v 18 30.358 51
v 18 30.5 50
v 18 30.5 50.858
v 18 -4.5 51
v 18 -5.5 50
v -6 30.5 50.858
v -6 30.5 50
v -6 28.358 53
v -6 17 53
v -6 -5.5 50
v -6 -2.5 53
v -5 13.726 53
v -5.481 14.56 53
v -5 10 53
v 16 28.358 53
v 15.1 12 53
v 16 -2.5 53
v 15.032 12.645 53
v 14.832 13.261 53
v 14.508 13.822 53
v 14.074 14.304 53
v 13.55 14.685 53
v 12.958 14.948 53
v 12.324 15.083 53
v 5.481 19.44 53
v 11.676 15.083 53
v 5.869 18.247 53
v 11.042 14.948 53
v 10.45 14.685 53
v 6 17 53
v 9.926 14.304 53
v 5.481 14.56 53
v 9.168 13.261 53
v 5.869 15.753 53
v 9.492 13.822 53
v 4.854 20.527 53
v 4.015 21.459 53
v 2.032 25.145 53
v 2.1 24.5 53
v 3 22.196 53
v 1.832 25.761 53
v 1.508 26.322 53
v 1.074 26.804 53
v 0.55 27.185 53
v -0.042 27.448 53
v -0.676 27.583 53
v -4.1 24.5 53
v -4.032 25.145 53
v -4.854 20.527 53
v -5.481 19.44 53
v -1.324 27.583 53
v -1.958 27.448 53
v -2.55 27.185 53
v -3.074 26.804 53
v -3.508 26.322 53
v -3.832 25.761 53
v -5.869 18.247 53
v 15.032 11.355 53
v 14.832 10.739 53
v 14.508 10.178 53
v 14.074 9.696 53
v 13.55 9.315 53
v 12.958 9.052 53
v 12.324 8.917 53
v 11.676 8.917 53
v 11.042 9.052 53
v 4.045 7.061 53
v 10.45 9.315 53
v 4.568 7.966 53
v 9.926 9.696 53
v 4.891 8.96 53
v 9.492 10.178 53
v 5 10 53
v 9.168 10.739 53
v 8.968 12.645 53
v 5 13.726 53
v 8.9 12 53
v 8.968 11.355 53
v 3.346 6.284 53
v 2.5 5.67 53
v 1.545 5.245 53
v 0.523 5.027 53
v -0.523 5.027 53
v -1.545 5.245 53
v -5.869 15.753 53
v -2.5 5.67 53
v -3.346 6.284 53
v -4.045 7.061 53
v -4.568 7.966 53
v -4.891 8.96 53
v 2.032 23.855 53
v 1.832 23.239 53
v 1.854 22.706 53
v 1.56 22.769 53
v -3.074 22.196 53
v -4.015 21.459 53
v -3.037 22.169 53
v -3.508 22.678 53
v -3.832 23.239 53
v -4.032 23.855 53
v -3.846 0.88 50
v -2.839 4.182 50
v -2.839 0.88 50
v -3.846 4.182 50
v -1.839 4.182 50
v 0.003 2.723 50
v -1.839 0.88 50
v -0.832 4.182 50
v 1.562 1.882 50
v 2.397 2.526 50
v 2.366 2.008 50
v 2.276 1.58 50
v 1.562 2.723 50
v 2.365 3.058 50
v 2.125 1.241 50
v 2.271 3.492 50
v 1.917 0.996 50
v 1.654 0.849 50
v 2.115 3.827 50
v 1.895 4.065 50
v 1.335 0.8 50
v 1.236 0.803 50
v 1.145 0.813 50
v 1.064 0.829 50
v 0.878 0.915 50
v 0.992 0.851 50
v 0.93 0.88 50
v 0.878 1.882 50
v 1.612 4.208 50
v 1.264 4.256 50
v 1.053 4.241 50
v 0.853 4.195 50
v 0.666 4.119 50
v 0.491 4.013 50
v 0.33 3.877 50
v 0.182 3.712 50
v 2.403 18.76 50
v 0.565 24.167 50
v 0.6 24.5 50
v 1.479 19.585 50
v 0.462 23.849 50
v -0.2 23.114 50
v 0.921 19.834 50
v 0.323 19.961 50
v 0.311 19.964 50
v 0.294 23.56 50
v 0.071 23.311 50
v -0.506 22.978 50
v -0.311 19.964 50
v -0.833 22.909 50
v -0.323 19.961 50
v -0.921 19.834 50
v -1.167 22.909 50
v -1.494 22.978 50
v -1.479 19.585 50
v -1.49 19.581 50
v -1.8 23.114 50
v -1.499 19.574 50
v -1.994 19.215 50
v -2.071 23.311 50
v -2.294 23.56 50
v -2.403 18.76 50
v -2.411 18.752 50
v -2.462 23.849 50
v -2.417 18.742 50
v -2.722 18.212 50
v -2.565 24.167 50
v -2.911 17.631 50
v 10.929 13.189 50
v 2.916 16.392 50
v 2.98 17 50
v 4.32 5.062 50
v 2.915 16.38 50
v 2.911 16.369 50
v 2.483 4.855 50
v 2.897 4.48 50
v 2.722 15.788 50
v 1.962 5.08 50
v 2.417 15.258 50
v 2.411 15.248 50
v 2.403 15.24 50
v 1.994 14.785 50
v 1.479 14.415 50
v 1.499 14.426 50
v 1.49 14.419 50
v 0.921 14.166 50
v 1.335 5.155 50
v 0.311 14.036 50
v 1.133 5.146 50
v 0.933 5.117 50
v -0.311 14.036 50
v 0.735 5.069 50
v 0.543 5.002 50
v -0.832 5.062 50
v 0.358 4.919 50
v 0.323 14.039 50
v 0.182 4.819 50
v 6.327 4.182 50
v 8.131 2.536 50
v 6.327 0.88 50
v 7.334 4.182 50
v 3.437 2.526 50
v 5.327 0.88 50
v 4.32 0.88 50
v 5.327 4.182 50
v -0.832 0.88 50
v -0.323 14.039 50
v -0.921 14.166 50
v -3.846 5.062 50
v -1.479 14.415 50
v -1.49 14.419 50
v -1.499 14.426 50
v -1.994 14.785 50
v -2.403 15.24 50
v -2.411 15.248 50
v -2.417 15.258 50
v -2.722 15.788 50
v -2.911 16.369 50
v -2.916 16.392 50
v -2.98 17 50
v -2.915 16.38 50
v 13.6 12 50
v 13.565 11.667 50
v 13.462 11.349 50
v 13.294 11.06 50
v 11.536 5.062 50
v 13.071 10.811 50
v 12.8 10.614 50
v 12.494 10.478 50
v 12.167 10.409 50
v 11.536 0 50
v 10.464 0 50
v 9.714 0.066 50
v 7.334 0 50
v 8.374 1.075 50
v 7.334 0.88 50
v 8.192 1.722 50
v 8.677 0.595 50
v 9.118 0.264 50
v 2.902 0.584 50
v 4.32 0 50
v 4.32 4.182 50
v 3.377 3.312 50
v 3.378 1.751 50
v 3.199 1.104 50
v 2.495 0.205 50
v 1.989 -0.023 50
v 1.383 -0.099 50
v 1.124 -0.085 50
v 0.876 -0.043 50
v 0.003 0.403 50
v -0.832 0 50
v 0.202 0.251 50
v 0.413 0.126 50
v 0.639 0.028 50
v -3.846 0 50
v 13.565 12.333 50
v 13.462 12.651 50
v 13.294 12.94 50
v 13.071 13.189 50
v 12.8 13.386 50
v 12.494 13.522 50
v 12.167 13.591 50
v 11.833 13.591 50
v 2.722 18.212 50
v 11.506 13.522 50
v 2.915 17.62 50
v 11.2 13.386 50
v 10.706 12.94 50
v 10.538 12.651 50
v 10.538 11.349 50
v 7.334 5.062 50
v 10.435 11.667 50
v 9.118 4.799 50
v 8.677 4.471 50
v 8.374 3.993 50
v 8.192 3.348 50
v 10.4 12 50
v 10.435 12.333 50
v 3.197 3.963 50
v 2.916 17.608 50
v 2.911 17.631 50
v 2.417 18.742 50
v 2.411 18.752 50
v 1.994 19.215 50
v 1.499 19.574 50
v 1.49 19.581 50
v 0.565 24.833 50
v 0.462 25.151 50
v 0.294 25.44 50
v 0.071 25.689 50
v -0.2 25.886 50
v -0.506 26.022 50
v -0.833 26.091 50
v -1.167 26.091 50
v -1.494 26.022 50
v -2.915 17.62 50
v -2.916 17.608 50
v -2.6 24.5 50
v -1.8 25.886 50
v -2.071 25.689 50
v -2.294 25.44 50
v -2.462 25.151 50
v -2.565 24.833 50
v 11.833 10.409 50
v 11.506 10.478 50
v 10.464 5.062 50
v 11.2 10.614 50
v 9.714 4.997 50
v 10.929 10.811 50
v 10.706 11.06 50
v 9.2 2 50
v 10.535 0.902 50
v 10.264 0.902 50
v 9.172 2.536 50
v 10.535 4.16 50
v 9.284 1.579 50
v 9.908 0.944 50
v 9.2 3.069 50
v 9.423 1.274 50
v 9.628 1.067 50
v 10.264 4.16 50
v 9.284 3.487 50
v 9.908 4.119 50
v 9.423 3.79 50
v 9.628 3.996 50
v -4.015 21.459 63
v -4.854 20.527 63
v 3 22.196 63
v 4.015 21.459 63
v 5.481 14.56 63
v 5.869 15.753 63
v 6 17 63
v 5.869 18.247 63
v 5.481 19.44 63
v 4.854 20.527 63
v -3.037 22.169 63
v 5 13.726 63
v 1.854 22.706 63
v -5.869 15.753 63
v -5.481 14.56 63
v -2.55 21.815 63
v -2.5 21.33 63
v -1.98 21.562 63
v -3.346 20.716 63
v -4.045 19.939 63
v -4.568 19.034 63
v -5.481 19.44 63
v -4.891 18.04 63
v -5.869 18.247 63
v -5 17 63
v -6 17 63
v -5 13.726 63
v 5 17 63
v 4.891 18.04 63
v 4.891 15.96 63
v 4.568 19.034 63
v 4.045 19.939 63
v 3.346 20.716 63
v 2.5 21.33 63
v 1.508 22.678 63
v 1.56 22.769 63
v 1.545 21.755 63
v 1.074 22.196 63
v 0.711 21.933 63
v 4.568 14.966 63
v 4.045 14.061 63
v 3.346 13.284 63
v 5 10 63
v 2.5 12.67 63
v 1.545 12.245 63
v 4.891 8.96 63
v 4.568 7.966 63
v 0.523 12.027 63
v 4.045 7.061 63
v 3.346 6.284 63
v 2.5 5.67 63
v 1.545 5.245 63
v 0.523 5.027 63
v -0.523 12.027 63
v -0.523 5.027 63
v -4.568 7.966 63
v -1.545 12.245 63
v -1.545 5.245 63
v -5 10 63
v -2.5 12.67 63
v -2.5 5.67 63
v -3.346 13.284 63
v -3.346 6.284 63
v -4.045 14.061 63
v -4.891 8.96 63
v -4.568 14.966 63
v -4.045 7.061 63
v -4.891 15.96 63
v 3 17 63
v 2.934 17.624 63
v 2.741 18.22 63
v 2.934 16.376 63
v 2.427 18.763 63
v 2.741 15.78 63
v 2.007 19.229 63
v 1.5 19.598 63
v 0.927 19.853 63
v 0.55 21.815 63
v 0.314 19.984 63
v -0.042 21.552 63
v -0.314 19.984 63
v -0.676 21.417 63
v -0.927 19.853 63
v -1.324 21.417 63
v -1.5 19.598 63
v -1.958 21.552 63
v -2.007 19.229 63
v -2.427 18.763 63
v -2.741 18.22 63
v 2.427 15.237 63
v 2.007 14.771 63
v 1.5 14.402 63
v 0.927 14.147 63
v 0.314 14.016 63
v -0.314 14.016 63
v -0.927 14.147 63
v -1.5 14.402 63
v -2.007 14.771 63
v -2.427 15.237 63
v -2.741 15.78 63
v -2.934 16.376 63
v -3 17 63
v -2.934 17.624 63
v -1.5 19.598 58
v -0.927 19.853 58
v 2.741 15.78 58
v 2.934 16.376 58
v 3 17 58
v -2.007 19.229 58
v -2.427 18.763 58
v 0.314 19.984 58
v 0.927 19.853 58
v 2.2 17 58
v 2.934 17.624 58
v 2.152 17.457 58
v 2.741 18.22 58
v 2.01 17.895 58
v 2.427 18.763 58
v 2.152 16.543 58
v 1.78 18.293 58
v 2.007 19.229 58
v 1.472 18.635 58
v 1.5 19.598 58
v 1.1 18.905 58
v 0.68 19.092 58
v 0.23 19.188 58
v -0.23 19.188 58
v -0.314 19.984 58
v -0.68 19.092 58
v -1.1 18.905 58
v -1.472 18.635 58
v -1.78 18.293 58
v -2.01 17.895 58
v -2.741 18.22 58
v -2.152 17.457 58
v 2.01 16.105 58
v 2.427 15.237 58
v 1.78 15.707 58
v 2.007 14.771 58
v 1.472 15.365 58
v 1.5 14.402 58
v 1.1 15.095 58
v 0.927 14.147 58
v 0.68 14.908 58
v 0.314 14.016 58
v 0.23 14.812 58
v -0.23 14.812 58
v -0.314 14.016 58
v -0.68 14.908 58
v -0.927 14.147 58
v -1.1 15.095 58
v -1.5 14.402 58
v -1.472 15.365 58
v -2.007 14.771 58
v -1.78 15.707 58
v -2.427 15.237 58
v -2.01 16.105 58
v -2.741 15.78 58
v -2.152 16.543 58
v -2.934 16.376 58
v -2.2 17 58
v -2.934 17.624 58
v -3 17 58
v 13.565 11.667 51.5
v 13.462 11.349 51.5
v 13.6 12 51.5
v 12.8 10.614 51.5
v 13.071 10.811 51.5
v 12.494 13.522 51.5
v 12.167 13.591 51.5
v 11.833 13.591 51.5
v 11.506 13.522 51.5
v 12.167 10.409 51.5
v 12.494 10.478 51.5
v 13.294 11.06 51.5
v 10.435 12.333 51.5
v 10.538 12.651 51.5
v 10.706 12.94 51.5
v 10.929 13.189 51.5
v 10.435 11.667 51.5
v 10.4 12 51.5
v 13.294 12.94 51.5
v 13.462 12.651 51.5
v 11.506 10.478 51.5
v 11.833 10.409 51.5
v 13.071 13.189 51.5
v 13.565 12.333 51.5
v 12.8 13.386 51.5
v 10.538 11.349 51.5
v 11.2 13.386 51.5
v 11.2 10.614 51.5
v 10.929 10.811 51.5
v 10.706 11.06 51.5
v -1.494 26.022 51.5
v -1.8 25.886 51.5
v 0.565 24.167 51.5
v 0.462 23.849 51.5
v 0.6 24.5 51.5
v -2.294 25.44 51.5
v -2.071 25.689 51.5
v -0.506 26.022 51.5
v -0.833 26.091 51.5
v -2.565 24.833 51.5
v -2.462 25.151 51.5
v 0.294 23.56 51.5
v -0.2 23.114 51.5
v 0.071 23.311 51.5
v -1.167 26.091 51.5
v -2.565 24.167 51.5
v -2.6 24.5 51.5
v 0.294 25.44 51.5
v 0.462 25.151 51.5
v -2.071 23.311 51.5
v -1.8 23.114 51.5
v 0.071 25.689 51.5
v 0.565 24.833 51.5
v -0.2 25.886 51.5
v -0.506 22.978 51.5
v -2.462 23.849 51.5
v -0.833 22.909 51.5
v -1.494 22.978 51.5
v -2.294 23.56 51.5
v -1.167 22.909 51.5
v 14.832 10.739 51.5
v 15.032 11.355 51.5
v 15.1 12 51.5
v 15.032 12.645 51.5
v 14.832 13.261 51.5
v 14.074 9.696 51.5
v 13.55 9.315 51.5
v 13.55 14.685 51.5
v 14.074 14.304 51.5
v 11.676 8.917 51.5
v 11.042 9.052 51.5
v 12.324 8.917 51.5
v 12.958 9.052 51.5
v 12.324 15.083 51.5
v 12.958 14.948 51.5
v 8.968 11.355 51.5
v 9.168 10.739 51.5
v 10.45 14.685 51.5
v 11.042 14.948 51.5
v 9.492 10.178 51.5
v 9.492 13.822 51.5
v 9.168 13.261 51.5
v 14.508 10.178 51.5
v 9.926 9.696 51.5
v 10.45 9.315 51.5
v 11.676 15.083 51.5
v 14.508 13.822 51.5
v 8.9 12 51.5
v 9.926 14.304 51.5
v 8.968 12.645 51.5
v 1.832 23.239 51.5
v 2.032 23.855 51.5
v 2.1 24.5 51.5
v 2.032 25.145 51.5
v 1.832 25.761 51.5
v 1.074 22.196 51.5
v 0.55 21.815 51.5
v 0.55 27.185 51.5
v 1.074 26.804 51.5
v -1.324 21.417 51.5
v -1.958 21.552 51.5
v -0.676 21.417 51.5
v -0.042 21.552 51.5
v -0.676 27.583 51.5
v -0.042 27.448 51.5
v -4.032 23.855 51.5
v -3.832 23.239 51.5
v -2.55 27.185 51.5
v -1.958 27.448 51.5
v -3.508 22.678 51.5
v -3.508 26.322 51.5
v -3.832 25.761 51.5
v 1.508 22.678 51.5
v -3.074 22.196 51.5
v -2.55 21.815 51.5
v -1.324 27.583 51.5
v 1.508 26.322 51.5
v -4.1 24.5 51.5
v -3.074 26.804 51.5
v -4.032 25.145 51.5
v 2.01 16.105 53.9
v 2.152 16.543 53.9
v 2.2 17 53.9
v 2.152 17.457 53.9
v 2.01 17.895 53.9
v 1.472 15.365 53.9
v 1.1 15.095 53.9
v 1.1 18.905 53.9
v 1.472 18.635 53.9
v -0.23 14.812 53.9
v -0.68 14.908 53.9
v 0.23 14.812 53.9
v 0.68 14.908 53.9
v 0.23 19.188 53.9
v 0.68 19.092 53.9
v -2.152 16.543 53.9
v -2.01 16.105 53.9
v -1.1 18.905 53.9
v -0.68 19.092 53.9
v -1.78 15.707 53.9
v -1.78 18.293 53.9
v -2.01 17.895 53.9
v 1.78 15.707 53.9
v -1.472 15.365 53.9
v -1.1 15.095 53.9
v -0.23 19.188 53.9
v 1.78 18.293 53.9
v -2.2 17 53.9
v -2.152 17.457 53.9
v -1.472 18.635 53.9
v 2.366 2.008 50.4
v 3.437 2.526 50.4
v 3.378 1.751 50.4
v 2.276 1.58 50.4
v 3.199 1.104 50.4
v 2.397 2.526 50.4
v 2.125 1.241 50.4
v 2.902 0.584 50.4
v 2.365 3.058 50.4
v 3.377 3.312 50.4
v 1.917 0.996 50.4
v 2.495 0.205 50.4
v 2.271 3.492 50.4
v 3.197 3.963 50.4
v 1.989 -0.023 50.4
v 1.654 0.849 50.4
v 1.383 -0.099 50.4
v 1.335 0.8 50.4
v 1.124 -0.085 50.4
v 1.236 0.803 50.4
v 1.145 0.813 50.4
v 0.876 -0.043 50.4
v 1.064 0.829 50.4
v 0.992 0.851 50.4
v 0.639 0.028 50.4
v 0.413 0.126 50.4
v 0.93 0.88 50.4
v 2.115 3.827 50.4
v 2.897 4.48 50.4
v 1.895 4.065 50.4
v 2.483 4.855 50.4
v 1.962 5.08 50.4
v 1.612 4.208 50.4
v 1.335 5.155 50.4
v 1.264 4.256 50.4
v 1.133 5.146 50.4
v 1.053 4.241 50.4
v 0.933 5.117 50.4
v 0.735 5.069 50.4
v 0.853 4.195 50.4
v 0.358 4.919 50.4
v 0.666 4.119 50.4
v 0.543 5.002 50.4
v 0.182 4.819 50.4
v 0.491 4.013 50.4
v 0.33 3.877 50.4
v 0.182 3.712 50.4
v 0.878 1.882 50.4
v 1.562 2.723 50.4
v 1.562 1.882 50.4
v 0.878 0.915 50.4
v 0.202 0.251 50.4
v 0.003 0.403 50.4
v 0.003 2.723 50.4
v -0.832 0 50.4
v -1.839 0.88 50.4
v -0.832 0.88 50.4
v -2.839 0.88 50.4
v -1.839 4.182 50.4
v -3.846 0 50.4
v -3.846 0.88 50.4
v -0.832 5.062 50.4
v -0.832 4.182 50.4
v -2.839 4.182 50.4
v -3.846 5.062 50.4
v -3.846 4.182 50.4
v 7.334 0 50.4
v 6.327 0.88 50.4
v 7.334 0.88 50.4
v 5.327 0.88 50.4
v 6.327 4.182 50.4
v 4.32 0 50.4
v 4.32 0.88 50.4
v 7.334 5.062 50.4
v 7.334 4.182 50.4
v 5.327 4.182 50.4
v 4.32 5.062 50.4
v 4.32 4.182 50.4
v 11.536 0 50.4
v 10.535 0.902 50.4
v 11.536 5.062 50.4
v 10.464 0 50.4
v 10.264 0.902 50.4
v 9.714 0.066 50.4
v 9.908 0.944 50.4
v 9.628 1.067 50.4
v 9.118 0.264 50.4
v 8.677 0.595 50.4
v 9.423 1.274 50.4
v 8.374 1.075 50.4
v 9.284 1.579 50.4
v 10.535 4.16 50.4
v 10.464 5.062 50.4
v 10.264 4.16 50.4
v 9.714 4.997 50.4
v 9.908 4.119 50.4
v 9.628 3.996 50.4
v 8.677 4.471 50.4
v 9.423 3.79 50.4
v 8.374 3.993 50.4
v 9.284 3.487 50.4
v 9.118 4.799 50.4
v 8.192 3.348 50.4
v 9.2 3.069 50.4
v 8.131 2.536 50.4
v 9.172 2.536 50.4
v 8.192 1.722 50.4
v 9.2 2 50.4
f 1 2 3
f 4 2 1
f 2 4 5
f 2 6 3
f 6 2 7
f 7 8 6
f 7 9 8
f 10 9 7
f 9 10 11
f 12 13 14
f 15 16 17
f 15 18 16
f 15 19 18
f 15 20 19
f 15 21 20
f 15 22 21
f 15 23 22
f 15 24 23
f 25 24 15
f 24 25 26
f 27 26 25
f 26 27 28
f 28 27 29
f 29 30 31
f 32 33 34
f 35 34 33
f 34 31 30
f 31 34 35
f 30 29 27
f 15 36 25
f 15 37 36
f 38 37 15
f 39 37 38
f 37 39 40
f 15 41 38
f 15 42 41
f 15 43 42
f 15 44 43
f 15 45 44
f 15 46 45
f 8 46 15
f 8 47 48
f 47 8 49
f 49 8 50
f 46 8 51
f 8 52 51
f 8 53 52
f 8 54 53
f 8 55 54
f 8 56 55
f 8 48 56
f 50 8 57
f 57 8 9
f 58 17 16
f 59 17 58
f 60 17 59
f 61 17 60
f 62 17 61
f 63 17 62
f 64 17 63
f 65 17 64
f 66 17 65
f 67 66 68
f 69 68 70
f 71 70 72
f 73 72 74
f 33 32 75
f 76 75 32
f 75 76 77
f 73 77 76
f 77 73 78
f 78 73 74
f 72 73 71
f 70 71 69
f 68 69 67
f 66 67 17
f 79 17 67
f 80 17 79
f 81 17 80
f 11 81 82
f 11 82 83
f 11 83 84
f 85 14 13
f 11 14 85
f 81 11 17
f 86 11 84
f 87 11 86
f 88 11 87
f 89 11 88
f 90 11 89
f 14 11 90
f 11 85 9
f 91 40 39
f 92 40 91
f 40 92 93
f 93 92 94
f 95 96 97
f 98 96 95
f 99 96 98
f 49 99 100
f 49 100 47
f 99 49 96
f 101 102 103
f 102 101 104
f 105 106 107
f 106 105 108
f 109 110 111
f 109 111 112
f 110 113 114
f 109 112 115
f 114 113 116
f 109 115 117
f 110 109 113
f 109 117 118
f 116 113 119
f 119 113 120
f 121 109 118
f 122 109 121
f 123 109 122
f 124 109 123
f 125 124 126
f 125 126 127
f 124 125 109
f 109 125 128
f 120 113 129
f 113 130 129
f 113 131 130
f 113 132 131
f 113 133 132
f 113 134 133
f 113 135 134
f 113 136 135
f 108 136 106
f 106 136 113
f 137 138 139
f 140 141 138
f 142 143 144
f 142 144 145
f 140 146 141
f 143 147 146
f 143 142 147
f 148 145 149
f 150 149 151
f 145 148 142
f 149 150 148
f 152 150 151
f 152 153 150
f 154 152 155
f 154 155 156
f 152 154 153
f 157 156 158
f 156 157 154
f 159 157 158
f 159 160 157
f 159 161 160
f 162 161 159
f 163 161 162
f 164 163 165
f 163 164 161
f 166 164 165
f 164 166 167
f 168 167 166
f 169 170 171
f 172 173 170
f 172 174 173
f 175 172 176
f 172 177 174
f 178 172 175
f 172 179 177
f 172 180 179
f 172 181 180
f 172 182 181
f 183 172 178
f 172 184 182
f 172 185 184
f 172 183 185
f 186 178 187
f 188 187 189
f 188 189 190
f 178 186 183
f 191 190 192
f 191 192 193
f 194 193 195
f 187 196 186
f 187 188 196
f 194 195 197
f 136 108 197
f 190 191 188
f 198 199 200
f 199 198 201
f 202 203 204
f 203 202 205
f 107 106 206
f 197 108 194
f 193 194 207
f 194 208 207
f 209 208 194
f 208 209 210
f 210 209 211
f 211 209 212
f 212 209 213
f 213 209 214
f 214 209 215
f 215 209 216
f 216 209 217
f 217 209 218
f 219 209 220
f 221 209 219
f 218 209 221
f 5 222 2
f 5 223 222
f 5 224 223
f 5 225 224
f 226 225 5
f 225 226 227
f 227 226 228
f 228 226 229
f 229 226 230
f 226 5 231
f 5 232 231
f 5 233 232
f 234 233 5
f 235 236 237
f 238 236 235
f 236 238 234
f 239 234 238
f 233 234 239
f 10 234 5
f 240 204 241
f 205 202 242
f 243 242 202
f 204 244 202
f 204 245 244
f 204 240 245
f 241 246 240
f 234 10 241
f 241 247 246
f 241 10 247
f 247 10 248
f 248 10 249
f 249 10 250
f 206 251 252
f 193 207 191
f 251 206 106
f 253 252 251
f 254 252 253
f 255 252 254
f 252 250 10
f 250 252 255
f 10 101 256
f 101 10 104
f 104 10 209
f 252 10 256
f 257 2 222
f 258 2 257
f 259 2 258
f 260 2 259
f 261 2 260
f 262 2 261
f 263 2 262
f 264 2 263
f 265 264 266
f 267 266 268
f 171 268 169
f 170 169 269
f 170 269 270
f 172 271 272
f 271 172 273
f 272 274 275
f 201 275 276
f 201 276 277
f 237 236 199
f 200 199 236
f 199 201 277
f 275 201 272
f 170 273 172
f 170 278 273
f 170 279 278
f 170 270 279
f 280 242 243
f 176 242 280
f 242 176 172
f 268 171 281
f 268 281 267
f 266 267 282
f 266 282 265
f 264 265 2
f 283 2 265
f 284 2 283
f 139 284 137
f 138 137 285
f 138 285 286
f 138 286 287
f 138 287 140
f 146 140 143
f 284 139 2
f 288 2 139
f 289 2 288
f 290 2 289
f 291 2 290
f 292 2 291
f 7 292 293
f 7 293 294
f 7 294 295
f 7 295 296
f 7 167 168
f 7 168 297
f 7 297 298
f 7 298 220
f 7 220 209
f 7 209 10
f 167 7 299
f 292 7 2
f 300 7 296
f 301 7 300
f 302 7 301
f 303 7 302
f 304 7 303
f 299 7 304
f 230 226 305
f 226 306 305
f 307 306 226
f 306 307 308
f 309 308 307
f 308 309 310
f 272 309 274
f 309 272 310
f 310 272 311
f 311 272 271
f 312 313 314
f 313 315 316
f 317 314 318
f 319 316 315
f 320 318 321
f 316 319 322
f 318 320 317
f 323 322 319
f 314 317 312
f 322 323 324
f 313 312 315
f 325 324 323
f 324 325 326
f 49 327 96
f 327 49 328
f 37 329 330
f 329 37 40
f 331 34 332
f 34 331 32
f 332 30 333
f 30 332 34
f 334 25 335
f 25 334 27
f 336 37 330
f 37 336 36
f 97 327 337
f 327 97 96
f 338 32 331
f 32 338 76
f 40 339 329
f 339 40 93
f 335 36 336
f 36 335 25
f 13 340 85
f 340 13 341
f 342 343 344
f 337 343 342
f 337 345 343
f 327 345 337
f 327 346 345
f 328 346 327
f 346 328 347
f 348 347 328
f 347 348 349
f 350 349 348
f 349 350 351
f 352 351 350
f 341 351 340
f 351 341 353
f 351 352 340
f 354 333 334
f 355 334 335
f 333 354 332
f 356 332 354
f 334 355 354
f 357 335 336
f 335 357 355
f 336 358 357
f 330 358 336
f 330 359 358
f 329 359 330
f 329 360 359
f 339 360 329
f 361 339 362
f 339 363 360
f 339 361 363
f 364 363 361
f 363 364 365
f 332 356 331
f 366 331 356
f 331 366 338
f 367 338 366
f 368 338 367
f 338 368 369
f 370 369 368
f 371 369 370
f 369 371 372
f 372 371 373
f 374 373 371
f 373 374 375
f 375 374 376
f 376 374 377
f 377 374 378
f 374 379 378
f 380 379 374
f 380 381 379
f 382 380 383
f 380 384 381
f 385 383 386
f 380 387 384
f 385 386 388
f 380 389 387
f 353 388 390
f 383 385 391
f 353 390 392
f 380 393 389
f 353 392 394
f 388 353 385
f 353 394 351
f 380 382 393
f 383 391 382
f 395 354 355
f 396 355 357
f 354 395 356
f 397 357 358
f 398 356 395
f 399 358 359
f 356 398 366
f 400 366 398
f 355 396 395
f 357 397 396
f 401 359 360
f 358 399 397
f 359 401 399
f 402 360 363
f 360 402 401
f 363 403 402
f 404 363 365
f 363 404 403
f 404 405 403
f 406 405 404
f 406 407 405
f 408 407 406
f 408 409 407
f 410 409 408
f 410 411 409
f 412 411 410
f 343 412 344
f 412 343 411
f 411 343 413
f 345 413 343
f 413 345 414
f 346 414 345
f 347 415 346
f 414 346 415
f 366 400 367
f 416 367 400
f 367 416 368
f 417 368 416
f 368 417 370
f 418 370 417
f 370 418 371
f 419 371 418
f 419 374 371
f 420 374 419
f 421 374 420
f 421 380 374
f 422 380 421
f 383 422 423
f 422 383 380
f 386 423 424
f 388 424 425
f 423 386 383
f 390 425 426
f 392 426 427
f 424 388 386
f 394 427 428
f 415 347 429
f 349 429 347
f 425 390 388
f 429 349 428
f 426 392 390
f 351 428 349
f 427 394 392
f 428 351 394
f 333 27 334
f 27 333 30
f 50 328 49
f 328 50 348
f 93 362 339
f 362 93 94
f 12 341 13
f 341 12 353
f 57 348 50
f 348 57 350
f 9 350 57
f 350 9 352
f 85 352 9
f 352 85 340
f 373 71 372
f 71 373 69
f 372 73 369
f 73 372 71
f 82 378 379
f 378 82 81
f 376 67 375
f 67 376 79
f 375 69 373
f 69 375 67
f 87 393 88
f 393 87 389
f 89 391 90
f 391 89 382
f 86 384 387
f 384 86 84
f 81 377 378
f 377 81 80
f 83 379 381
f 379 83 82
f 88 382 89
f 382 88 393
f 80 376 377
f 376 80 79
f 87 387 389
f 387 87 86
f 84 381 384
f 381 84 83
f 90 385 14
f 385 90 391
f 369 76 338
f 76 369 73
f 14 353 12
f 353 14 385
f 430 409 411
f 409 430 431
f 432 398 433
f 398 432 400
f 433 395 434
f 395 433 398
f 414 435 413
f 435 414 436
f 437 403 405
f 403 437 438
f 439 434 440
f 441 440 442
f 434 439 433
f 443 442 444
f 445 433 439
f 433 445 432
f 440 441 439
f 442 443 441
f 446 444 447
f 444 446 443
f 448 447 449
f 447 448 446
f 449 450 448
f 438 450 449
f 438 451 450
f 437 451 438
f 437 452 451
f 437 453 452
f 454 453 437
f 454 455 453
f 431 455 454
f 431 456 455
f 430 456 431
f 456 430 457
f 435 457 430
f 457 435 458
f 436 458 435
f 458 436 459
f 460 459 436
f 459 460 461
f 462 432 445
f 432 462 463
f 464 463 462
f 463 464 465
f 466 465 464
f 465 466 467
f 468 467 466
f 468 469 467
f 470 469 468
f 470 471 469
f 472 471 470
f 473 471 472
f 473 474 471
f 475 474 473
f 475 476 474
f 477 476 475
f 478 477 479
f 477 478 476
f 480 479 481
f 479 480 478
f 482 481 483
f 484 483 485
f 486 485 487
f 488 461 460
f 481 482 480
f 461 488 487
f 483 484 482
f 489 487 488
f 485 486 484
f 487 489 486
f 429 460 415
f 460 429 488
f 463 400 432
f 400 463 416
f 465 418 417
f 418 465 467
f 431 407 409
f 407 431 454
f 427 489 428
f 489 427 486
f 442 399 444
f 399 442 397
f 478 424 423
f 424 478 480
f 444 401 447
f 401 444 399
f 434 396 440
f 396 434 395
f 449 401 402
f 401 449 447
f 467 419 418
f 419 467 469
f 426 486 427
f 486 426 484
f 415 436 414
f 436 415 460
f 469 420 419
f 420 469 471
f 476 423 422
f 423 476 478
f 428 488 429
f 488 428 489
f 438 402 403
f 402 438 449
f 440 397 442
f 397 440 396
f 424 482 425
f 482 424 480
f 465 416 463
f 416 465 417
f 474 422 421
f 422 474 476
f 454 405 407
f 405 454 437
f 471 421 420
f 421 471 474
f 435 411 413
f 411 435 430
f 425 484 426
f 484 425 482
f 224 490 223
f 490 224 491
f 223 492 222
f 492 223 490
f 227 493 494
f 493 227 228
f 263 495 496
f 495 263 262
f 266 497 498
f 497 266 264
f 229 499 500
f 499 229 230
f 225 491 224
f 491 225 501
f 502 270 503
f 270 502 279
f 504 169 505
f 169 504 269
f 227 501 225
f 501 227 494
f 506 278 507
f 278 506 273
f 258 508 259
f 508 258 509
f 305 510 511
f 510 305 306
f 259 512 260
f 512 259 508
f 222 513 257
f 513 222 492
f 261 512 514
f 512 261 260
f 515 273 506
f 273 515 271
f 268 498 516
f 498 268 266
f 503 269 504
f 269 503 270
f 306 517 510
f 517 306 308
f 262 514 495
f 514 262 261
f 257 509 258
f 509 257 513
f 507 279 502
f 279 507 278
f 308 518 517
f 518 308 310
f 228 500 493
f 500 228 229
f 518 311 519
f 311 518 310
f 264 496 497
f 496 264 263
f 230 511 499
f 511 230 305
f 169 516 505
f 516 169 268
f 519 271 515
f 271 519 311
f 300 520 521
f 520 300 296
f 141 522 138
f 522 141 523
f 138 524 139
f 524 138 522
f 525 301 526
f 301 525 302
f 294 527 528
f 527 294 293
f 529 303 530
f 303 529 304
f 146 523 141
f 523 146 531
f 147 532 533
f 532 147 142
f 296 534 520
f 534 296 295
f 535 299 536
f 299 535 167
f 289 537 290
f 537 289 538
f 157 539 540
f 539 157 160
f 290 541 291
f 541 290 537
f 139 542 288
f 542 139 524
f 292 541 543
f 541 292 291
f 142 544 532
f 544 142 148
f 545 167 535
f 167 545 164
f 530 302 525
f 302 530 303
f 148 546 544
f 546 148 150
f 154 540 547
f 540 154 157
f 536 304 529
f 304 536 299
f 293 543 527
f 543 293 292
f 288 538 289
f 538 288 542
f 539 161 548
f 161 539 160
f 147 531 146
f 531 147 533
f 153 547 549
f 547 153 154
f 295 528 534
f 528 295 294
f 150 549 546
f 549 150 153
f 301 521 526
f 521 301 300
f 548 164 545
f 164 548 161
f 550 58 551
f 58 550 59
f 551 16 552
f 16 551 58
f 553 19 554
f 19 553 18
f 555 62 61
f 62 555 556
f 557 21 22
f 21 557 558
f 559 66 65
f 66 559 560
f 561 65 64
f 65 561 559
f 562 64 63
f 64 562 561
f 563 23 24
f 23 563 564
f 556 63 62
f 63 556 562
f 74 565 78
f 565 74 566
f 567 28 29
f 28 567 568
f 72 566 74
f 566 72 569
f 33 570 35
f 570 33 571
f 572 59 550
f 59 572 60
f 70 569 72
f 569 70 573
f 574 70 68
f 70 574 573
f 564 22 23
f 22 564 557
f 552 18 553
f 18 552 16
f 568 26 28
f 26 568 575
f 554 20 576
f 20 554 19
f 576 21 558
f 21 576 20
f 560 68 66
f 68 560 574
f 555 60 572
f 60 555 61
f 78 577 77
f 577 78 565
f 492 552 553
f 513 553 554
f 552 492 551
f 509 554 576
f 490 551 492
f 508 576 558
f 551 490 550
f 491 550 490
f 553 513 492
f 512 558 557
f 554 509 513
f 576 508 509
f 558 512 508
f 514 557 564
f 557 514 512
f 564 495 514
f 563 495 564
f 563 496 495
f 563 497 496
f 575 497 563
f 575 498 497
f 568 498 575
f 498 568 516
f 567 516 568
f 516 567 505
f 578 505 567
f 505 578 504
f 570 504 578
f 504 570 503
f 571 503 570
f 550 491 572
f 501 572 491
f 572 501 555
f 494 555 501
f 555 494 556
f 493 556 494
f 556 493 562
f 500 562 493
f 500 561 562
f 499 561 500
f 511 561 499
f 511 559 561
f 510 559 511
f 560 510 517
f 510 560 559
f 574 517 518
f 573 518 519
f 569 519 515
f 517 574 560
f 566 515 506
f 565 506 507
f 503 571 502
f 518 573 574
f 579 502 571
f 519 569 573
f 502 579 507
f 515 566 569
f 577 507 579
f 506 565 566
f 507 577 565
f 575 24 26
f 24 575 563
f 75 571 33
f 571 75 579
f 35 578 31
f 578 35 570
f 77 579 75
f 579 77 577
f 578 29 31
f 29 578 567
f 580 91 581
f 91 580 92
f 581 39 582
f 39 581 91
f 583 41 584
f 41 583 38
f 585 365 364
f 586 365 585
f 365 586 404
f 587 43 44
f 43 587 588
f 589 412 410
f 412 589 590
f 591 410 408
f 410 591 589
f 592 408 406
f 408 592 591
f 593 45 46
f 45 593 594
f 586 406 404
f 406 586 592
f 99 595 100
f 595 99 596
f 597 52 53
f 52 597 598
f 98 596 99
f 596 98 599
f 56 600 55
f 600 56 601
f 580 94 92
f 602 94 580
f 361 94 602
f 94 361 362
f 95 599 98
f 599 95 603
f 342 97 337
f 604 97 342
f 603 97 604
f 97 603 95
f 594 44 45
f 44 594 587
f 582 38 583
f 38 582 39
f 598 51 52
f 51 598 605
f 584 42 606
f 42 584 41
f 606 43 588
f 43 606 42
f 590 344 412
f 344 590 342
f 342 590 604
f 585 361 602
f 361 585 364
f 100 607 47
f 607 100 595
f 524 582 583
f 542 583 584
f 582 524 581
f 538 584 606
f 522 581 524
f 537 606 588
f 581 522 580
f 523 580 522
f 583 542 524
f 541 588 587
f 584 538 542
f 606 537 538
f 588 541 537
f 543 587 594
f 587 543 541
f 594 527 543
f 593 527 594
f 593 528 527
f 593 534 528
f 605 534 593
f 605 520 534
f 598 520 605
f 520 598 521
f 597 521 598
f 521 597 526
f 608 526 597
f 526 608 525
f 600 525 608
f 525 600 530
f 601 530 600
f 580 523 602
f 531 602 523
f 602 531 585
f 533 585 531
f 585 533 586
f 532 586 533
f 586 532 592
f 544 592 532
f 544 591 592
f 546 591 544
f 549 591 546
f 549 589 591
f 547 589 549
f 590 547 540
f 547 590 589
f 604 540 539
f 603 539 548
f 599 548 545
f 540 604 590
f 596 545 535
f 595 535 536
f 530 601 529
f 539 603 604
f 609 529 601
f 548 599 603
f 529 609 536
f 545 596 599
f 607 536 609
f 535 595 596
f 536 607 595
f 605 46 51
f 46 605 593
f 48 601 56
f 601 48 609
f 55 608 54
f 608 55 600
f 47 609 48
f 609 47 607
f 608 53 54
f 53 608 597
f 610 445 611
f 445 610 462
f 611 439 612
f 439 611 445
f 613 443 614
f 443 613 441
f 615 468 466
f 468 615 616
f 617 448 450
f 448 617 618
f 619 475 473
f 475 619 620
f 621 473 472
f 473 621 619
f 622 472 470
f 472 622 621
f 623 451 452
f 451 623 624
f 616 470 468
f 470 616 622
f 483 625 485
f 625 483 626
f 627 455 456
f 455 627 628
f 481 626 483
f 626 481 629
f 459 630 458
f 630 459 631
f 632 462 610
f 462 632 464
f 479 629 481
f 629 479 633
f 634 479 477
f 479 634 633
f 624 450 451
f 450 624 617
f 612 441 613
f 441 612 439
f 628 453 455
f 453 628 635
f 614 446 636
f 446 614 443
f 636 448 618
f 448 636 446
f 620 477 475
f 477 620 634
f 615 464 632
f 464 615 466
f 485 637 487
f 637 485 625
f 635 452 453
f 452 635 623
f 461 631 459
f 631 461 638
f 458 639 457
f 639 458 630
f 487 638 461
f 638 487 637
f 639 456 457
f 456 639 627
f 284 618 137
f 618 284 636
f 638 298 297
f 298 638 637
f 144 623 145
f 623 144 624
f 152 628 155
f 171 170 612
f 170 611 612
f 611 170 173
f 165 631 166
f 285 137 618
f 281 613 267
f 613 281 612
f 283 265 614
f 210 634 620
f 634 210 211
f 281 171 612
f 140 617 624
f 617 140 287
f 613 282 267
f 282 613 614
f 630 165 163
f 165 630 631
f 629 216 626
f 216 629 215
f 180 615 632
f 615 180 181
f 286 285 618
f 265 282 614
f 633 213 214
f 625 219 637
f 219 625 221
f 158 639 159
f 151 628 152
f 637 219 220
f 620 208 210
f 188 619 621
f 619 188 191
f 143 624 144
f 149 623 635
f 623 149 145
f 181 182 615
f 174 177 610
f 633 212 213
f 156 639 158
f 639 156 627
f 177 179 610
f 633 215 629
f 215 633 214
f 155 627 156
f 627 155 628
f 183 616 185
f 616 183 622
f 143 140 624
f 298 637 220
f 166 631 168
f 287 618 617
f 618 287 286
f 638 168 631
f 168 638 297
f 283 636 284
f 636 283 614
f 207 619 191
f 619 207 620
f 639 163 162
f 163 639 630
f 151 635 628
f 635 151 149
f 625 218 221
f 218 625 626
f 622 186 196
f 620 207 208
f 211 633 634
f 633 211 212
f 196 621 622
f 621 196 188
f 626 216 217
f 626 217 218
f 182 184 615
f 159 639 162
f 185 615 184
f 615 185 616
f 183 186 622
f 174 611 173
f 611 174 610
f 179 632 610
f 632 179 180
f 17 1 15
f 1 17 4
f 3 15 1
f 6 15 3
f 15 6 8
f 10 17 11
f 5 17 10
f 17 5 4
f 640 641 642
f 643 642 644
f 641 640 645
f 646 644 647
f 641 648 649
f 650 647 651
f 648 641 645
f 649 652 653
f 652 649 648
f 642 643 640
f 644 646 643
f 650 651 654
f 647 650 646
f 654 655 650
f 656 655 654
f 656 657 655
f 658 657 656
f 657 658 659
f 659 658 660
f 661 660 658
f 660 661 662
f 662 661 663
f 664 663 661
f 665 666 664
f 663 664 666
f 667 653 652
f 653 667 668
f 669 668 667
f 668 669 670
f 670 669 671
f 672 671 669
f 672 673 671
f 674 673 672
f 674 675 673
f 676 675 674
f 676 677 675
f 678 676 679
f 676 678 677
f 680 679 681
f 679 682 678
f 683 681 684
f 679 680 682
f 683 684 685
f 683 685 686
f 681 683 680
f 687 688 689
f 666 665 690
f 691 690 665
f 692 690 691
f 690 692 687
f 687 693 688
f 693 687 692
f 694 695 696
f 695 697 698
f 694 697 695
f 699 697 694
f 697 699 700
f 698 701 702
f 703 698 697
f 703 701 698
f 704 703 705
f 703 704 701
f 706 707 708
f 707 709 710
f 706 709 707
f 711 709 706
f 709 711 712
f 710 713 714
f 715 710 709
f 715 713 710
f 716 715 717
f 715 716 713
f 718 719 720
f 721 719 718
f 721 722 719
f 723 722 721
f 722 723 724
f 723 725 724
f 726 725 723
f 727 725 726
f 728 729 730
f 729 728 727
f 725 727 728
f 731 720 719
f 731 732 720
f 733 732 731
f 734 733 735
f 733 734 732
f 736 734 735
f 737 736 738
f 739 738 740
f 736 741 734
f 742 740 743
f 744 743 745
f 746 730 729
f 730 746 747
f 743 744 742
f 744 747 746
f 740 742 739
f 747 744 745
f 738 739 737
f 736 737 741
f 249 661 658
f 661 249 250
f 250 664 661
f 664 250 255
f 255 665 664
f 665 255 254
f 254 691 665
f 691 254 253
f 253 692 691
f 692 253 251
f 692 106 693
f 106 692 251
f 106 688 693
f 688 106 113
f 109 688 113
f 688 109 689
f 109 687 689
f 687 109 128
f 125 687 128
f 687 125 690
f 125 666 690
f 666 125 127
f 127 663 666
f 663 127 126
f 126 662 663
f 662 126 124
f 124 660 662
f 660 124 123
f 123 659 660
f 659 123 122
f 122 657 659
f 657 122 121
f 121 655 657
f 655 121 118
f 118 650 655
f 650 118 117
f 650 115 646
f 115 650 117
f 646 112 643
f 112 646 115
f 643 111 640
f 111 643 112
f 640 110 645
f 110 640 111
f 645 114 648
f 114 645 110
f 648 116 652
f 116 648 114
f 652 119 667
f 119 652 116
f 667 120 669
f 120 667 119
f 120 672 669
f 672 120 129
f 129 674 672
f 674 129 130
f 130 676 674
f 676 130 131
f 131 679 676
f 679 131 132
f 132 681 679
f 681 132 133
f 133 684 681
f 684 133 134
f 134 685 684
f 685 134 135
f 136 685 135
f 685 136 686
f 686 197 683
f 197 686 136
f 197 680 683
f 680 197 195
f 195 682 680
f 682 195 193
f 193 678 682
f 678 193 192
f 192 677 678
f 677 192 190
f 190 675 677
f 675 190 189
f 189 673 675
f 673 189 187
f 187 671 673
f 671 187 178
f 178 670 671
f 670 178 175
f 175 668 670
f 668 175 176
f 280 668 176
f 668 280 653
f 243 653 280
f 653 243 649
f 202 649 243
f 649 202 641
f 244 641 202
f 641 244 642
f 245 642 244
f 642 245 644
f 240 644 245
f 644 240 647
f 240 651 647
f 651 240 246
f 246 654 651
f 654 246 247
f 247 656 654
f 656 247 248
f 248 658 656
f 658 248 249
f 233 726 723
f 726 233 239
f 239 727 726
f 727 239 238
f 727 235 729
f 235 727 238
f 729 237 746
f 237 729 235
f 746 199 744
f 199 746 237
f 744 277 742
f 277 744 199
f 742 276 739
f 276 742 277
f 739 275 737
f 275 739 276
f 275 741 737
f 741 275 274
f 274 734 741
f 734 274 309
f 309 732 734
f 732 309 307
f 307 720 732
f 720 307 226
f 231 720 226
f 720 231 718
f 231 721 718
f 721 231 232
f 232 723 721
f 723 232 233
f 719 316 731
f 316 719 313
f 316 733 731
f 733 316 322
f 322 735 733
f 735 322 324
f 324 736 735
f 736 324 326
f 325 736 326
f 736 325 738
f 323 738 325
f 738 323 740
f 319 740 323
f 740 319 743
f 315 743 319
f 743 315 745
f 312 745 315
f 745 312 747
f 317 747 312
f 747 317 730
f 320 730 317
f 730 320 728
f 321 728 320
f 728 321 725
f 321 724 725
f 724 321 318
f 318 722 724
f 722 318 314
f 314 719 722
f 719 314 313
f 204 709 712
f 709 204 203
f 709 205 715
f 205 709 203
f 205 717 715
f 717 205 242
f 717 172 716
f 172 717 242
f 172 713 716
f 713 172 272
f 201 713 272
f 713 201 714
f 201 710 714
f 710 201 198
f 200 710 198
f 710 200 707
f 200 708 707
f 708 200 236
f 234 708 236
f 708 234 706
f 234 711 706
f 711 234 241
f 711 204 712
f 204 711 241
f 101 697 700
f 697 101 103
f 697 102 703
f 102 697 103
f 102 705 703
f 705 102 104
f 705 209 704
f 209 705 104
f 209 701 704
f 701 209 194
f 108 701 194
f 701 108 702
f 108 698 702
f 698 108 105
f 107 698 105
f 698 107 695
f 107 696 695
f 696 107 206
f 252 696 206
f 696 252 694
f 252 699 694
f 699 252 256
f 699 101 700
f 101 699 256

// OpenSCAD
// PRUSA iteration4
// Filament sensor cover
// GNU GPL v3
// Josef Průša <iam@josefprusa.cz> and contributors
// http://www.reprap.org/wiki/Prusa_Mendel
// http://prusamendel.org

module part()
{
    difference()
    {
        union()
            {   
                // base shape
                translate([-6,50,-30.5]) cube([24,3,36]);
                translate([0,63,-17]) rotate([90,0,0]) cylinder(r=6,h = 13, $fn=30); 
                translate([0,63,-10]) rotate([90,0,0]) cylinder(r=5,h = 13, $fn=30); 
                
                translate([-5,50,-17]) cube([10,13,7]);
              
            }
            
            // brass insert hole
            translate([0,63.5,-17]) rotate([90,0,0]) cylinder(r=3,h = 5.5, $fn=30); 
            translate([0,65,-17]) rotate([90,0,0]) cylinder(r=5,h = 2, $fn=30); 
            
            // mounting screws
            translate([12,60,-12]) rotate([90,0,0]) cylinder(r=1.6,h = 20, $fn=30); 
            translate([-1,60,-24.5]) rotate([90,0,0]) cylinder(r=1.6,h = 20, $fn=30); 
                
            translate([12,54.5,-12]) rotate([90,0,0]) cylinder(r=3.1,h = 3, $fn=30); 
            translate([-1,66.5,-24.5]) rotate([90,0,0]) cylinder(r=3.1,h = 15, $fn=30); 

            // filament guide
            translate([0,59.8,-17]) rotate([90,0,0]) cylinder(r=2.2,h = 9.8, $fn=30); 
            translate([0,61,-17]) rotate([90,0,0]) cylinder(r=1,h = 20, $fn=30);     
            translate([0,62.5,-17]) rotate([90,0,0]) cylinder(r2=1.2, r1=3,h = 3, $fn=30);     
            translate([0,53.9,-17]) rotate([90,0,0]) cylinder(r1=2.2, r2=3,h = 4, $fn=30);     
                
                
            // nice edges    
            translate([19,50,-40]) rotate([0,0,45]) cube([10,10,50]);
            translate([-8,56.5,-39]) rotate([45,0,0]) cube([50,10,10]);
            translate([-8,56.5,-1]) rotate([45,0,0]) cube([50,10,10]);


        translate([12,50.4,0]) rotate([90,180,0]) linear_extrude(height = 0.6) 
        { text("DIGI",font = "monospace:style=Bold", size=5, center=true); }
    }
}


rotate([90,0,0]) 
part();
